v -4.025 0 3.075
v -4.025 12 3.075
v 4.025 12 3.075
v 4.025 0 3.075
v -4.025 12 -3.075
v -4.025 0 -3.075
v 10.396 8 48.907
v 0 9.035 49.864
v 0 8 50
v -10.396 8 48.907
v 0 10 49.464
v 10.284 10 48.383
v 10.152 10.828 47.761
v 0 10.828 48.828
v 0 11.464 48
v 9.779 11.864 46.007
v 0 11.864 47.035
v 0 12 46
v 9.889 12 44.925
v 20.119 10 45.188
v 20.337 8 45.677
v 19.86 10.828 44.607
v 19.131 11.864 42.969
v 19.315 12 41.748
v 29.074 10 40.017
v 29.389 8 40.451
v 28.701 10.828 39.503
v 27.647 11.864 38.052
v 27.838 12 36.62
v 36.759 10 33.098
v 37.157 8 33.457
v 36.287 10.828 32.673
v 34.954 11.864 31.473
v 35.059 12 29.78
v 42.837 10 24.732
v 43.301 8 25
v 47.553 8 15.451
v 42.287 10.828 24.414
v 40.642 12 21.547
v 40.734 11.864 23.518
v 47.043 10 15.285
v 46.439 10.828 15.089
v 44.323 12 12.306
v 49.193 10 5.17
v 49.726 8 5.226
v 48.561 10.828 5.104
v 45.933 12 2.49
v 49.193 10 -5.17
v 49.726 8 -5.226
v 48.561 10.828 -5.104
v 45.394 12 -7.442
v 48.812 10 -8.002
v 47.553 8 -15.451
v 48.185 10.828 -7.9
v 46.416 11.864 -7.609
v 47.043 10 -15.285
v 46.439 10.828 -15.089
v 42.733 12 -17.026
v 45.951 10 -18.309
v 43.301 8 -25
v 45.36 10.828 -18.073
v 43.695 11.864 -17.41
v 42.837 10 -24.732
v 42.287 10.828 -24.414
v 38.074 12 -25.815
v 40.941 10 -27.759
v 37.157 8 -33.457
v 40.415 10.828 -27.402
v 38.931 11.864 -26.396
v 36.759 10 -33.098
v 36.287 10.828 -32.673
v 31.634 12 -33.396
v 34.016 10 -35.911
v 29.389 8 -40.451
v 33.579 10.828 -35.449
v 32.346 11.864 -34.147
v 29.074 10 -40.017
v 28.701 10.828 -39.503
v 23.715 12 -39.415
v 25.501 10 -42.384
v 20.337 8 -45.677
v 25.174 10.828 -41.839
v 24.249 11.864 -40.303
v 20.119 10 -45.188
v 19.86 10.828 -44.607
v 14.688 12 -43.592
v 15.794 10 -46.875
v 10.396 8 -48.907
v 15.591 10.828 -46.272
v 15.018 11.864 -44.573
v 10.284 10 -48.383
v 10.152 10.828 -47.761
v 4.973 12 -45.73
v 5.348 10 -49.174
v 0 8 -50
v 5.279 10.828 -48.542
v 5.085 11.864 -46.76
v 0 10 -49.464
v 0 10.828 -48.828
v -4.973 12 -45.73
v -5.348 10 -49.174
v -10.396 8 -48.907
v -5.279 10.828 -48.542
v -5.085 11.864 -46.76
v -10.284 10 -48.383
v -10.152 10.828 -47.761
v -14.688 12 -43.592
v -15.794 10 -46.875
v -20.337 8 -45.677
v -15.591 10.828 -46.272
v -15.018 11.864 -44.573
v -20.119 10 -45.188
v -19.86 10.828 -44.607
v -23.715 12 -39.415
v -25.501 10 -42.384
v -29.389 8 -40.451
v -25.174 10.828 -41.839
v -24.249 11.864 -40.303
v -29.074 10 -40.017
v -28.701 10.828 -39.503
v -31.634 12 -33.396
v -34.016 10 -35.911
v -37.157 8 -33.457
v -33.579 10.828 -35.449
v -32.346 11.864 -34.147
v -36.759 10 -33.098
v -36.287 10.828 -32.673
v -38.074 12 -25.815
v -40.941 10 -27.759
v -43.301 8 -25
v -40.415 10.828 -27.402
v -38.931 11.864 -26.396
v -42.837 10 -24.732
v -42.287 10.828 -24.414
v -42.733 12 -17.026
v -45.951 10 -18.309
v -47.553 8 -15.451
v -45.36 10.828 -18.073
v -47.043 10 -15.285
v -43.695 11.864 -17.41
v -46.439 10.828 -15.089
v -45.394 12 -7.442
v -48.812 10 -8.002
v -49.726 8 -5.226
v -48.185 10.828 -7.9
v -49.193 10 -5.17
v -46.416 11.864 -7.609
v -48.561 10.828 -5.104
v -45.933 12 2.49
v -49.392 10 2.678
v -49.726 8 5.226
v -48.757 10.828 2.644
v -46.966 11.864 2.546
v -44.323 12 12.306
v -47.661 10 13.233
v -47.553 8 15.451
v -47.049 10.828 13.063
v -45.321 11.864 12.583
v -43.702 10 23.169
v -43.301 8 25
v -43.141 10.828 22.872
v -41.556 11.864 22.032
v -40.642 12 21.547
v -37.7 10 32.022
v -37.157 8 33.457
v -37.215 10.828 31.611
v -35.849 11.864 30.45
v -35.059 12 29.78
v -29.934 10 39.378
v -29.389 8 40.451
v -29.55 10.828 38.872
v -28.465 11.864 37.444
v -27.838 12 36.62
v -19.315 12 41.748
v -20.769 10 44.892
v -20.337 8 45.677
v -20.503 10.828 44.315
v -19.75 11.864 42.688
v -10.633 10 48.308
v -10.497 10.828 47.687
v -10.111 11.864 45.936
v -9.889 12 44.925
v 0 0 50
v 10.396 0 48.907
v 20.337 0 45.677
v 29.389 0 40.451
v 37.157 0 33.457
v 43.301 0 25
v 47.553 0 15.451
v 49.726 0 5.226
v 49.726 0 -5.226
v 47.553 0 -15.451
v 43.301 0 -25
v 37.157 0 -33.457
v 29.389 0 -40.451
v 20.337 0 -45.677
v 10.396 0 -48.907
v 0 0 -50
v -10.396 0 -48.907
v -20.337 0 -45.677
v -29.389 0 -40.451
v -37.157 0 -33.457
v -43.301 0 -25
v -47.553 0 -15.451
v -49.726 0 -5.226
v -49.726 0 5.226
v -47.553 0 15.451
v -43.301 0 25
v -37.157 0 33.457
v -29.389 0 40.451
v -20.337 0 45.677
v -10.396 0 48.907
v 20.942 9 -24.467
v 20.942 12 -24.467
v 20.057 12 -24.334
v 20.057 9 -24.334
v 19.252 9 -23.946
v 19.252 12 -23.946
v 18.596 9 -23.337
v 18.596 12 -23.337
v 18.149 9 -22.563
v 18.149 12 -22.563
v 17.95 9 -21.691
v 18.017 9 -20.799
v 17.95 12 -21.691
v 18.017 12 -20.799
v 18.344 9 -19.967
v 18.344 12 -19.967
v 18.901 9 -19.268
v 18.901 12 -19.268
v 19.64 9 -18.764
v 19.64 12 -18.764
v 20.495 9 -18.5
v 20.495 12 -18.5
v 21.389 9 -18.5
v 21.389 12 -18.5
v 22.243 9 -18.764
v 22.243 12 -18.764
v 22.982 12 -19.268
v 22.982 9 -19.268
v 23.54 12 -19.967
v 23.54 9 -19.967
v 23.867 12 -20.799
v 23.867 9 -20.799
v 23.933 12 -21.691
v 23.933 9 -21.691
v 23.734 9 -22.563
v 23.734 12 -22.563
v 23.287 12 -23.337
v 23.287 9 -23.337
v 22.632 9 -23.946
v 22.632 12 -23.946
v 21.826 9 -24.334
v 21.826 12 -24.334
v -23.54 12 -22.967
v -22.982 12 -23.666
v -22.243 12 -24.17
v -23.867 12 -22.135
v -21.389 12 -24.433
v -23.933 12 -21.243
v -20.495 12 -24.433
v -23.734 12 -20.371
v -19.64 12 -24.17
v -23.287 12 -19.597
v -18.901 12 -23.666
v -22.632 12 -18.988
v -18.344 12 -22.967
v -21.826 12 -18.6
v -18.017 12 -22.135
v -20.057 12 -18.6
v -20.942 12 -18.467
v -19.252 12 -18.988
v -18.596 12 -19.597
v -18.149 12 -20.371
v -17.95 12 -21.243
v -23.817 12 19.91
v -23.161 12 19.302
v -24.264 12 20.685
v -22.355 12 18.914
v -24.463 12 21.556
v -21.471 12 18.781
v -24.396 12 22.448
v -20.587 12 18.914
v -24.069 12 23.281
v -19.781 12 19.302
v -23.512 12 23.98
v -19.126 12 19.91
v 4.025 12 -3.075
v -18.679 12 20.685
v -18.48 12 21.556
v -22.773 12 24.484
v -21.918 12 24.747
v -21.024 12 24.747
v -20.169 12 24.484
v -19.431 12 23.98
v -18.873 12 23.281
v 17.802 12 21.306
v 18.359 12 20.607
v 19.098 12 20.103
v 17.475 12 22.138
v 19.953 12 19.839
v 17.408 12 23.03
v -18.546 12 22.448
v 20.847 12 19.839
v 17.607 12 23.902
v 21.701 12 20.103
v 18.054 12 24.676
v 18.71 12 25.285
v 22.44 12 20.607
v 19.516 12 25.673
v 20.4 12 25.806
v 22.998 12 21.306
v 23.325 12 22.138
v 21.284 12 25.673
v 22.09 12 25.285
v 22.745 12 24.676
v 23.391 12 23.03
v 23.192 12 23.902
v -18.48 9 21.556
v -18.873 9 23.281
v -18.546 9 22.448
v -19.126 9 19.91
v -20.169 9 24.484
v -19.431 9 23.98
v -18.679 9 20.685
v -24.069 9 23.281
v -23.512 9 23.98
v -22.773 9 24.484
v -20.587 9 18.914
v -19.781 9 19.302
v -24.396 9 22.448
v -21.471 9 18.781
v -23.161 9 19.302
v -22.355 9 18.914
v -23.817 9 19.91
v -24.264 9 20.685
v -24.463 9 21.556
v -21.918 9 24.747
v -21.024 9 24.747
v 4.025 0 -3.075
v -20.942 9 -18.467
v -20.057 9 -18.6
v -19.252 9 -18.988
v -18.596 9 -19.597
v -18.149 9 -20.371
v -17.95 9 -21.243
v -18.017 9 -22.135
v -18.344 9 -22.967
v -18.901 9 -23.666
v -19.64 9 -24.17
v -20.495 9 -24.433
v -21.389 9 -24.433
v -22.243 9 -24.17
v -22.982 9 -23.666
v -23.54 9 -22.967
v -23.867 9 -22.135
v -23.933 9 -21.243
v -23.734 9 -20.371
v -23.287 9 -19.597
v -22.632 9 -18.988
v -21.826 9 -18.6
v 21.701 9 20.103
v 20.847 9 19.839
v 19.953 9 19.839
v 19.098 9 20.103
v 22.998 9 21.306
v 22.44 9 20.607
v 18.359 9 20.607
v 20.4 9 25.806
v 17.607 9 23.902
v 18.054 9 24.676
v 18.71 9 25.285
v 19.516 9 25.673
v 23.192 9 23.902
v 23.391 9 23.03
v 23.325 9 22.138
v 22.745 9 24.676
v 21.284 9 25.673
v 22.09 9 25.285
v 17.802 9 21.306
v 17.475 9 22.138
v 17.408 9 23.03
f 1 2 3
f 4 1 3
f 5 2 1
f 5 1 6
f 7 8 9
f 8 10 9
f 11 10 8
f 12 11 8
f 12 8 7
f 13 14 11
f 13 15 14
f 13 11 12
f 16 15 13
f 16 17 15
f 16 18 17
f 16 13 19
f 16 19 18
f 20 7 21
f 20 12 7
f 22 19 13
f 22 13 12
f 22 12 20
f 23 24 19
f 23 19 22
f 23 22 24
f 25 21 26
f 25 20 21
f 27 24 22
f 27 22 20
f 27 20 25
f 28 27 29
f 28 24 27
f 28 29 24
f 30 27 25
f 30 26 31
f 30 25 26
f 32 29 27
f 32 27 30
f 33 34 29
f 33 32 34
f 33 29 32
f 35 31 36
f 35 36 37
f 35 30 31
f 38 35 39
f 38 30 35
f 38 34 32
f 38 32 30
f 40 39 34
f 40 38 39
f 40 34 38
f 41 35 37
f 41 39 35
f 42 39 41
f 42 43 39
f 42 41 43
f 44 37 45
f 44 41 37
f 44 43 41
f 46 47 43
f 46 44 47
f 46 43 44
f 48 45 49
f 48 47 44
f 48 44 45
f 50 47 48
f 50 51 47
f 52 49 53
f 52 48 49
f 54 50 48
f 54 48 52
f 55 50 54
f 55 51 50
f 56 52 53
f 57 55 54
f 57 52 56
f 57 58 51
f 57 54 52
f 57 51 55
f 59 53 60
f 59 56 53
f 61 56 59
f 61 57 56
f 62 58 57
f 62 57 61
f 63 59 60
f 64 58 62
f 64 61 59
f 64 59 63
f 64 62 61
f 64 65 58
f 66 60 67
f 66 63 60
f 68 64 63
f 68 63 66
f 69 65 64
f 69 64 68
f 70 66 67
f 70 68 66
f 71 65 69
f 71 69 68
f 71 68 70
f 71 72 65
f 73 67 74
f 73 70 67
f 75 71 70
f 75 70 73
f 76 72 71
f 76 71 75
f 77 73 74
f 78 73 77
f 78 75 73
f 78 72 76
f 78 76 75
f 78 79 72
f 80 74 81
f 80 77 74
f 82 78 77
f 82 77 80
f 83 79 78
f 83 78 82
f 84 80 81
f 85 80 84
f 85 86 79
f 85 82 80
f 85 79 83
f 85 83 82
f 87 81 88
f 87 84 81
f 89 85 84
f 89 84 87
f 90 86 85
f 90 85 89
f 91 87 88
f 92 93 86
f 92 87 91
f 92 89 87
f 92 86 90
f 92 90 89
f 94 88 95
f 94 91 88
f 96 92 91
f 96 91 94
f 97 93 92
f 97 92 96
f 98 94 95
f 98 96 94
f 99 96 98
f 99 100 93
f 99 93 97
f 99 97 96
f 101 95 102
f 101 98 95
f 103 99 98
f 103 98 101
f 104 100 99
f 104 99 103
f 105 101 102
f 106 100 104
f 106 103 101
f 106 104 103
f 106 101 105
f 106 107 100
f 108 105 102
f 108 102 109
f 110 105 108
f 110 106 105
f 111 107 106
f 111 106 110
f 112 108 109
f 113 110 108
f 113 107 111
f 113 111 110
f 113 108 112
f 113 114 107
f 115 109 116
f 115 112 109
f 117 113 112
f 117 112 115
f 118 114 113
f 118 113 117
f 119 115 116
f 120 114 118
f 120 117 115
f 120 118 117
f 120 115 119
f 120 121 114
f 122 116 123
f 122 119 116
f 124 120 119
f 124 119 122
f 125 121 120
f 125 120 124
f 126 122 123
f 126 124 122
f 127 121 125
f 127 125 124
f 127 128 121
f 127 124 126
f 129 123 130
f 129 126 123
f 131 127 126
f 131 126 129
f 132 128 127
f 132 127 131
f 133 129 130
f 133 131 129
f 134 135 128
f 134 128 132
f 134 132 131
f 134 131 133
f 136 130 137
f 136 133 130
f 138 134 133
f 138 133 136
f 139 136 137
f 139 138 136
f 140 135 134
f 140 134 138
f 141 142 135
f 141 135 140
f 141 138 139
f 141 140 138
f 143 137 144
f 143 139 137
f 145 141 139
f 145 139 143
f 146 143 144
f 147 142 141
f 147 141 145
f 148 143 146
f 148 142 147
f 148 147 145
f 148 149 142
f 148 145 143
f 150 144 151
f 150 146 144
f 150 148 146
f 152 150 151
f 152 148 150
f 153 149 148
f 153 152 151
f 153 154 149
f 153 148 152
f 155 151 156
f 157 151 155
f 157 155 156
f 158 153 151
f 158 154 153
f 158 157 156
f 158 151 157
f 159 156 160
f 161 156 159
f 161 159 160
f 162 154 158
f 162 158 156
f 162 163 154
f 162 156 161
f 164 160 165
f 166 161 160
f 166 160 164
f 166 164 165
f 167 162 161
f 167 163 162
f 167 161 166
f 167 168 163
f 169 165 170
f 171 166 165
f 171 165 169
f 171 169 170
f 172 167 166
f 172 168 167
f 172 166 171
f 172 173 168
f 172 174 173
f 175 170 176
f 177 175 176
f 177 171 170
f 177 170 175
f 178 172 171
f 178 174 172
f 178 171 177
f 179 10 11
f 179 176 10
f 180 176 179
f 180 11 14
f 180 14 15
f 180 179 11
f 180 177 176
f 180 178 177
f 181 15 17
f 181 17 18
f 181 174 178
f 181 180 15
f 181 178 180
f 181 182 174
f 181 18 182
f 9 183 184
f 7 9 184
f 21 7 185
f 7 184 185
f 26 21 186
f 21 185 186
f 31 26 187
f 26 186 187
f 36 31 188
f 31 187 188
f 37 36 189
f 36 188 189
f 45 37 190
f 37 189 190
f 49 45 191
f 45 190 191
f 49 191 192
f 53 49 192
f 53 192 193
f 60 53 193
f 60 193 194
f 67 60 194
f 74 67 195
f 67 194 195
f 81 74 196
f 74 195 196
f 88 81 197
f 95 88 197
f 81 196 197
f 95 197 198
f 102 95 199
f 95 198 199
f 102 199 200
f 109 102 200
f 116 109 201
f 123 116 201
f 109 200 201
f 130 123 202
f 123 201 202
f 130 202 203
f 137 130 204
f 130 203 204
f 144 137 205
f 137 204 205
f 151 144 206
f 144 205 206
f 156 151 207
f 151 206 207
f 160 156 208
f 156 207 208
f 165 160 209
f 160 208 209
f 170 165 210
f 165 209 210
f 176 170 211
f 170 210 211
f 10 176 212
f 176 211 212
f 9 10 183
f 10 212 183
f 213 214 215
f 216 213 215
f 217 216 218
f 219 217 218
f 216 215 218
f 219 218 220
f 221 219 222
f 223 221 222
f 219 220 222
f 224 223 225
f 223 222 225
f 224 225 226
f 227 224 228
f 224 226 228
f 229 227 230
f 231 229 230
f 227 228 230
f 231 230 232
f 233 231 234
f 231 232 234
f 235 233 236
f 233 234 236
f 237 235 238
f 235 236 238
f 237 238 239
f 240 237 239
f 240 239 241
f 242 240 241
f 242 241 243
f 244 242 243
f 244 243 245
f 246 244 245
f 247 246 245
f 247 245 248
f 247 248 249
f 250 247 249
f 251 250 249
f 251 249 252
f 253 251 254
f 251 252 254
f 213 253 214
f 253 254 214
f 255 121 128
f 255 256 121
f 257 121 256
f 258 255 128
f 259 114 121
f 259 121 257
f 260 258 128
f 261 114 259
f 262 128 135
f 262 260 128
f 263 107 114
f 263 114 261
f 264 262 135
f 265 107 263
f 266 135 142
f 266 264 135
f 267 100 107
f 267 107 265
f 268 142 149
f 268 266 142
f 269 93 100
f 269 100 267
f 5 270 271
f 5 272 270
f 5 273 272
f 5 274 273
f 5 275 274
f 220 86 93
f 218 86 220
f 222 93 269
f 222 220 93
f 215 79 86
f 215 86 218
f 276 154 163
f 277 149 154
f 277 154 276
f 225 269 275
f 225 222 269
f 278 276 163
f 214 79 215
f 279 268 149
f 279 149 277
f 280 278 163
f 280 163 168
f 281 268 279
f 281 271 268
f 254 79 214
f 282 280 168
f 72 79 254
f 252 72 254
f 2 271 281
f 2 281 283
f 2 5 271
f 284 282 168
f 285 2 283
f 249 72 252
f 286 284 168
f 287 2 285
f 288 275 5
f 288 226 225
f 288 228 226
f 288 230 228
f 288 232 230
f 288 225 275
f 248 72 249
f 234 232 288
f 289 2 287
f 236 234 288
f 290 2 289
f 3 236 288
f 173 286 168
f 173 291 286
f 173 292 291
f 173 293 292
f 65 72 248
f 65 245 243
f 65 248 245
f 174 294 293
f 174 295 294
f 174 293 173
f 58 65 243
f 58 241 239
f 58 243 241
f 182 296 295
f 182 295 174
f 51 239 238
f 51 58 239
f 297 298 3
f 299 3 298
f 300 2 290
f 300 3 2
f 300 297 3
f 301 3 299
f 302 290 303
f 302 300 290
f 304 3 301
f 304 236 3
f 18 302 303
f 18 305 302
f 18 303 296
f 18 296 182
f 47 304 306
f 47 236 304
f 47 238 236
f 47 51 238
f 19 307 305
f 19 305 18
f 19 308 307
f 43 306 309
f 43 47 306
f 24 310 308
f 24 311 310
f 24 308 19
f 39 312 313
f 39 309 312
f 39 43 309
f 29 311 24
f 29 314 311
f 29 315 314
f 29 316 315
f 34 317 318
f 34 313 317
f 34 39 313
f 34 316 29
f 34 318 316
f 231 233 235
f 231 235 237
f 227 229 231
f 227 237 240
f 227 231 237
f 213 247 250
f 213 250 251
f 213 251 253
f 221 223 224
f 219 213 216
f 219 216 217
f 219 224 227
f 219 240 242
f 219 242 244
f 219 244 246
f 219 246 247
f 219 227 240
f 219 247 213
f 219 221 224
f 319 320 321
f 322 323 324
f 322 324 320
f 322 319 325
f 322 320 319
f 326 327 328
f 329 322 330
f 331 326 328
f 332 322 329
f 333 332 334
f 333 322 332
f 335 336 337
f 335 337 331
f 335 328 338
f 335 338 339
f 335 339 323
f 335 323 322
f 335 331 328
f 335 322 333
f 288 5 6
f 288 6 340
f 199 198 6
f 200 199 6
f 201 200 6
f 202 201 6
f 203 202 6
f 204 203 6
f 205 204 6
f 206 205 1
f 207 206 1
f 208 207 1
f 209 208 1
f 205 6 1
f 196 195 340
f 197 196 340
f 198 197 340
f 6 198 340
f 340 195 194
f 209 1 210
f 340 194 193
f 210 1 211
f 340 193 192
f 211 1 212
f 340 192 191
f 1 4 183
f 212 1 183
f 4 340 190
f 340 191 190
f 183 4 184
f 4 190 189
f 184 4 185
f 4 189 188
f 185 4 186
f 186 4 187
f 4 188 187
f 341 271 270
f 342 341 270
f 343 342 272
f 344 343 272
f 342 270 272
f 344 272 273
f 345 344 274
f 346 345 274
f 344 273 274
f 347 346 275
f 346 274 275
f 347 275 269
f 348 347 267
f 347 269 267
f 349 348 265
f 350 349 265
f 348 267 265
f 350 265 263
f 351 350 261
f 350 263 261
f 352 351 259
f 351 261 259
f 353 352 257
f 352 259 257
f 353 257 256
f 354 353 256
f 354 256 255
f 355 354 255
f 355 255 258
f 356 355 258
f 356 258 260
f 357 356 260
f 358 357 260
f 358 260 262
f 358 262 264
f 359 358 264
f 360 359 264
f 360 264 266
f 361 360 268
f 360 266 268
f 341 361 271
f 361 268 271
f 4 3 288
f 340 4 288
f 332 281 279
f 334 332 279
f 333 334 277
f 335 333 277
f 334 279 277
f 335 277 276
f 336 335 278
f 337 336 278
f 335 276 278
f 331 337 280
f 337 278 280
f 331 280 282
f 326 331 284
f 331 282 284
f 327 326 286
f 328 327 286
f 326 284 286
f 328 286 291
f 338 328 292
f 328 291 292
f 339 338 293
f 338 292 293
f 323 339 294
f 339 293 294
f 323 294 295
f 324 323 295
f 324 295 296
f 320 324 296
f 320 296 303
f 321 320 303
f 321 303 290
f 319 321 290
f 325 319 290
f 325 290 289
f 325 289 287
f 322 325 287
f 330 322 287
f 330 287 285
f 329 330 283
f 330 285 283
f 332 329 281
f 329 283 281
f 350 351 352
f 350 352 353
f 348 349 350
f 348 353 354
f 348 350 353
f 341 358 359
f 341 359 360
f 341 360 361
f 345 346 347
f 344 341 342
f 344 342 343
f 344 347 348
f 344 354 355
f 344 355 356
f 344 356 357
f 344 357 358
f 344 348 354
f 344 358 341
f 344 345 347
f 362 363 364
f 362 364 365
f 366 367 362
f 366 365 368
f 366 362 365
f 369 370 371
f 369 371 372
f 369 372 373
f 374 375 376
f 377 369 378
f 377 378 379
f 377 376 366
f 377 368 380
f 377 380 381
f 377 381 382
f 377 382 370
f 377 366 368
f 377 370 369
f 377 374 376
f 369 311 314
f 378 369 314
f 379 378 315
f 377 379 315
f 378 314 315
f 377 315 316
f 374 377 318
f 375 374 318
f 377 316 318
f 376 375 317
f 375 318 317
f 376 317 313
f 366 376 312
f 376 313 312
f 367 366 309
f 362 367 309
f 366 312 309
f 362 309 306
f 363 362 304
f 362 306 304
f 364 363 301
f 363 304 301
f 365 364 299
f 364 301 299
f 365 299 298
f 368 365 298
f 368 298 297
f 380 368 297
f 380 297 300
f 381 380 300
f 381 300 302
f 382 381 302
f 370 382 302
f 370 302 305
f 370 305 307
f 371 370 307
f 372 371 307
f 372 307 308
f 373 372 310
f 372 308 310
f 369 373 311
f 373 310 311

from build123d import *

# Parameters (mm, degrees)
SKETCH_1_R          = 50
EXTRUDE_1_DEPTH     = 12
FILLET_1_R          = 4
SKETCH_5_R          = 3
CUT_EXTRUDE_1_DEPTH = 3
SKETCH_7_W          = 8.05
SKETCH_7_H          = 6.15
CUT_EXTRUDE_2_DEPTH = 72.721684308


with BuildPart() as part:
    # 草图1 → 凸台-拉伸1 (new body)
    with BuildSketch(Plane(origin=(0, 0, 0), x_dir=(1, 0, 0), z_dir=(0, 1, 0))):
        with Locations(Location((0, 0, 0), (0, 0, 270))):
            Circle(SKETCH_1_R)
    extrude(amount=EXTRUDE_1_DEPTH)

    # 圆角1
    fillet_1_edges = [part.edges().sort_by_distance(p)[0] for p in [
        (0, 12, -50),
    ]]
    fillet(fillet_1_edges, radius=FILLET_1_R)

    # 草图5 → 切除-拉伸1 (cut)
    with BuildSketch(Plane(origin=(0, 12, 0), x_dir=(1, 0, 0), z_dir=(0, 1, 0))):
        with Locations(Location((-20.941763413, 21.466971597, 0), (0, 0, 270))):
            Circle(SKETCH_5_R)
        with Locations(Location((20.941763413, 21.466971597, 0), (0, 0, 90))):
            Circle(SKETCH_5_R)
        with Locations(Location((20.399845913, -22.80585614, 0), (0, 0, 270))):
            Circle(SKETCH_5_R)
        with Locations(Location((-21.471132177, -21.780666781, 0), (0, 0, 90))):
            Circle(SKETCH_5_R)
    extrude(amount=-CUT_EXTRUDE_1_DEPTH, mode=Mode.SUBTRACT)

    # 草图7 → 切除-拉伸2 (cut, through all)
    with BuildSketch(Plane(origin=(0, 12, 0), x_dir=(1, 0, 0), z_dir=(0, 1, 0))):
        Rectangle(SKETCH_7_W, SKETCH_7_H)
    extrude(amount=-CUT_EXTRUDE_2_DEPTH, mode=Mode.SUBTRACT)


solid = part.part
